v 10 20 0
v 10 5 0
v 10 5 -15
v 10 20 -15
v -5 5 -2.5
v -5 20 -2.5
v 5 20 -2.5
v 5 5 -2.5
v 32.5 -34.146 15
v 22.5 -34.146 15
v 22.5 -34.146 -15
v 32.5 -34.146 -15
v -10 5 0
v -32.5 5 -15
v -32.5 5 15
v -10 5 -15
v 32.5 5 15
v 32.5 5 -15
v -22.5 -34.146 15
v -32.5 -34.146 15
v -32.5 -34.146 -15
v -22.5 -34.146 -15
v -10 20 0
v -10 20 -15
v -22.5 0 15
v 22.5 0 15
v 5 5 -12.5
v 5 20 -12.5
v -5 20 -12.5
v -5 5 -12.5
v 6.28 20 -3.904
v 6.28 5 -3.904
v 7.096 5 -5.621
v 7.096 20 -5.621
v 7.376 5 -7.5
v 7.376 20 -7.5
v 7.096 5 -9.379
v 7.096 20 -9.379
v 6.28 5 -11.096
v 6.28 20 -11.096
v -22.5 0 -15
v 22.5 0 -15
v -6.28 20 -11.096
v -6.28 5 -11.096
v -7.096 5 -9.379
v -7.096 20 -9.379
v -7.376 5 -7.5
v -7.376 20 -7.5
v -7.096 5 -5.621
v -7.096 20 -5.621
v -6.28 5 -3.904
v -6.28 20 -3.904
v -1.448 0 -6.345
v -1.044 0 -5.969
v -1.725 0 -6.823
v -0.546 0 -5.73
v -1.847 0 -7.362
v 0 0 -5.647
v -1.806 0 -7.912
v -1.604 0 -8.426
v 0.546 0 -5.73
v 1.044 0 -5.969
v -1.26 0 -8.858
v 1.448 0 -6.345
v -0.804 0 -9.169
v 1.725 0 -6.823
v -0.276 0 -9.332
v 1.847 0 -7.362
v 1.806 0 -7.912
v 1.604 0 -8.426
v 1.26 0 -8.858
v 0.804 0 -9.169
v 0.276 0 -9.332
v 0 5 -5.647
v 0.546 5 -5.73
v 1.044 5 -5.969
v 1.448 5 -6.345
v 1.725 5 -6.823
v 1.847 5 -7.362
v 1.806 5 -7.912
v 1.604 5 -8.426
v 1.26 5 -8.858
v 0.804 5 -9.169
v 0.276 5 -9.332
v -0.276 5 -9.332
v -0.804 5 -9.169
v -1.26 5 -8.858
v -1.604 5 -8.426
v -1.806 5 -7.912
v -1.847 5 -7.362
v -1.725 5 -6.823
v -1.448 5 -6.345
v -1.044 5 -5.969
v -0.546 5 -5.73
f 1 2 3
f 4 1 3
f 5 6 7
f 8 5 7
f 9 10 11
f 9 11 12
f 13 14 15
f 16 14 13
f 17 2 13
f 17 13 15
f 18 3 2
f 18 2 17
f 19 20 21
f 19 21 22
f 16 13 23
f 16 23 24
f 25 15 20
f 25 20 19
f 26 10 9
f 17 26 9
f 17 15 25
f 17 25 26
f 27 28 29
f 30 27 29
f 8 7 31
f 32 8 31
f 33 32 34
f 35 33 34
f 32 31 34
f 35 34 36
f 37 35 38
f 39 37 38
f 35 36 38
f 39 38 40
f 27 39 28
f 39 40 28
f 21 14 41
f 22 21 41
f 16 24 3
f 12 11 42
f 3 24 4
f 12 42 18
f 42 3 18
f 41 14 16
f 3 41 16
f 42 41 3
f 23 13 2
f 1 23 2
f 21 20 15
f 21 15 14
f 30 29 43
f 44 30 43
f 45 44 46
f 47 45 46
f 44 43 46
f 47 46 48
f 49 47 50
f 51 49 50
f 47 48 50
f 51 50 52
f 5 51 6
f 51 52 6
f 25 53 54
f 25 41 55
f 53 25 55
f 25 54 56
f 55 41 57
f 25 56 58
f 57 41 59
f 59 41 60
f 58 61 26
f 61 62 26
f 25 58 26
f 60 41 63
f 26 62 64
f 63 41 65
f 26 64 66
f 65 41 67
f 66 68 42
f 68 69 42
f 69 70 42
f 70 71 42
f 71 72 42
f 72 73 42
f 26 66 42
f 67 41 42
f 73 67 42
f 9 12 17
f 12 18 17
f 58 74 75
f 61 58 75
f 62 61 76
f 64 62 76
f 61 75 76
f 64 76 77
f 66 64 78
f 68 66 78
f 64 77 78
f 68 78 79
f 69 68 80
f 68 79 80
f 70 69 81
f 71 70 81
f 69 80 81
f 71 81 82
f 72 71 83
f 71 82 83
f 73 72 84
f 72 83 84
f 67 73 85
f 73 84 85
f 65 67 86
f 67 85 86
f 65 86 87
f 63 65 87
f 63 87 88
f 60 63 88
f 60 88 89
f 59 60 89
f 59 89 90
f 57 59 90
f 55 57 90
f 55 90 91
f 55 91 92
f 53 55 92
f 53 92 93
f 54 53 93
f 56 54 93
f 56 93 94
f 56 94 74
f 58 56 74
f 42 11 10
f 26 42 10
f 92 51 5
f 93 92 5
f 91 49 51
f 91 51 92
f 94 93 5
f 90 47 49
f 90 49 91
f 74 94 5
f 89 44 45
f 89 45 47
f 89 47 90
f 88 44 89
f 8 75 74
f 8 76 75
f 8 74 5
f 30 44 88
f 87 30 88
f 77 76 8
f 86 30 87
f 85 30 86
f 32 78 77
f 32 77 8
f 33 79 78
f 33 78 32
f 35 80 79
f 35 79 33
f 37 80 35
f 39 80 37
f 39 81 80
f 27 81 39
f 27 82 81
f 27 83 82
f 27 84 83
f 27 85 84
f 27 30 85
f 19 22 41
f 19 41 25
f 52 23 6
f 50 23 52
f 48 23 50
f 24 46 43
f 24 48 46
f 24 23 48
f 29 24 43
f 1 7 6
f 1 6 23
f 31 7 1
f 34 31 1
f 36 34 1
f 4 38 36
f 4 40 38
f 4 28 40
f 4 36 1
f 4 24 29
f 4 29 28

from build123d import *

# Parameters (mm, degrees)
SKETCH1_W           = 65
SKETCH1_H           = 30
BOSS_EXTRUDE1_DEPTH = 5
SKETCH2_W           = 20
SKETCH2_H           = 15
BOSS_EXTRUDE2_DEPTH = 15
CUT_EXTRUDE1_DEPTH  = 15
SKETCH4_R           = 1.852641707
CUT_EXTRUDE2_DEPTH  = 39.810436741
SKETCH5_W           = 10
SKETCH5_H           = 30
BOSS_EXTRUDE3_DEPTH = 34.146213


with BuildPart() as part:
    # Sketch1 → Boss-Extrude1 (new body)
    with BuildSketch(Plane(origin=(0, 0, 0), x_dir=(1, 0, 0), z_dir=(0, 1, 0))):
        Rectangle(SKETCH1_W, SKETCH1_H)
    extrude(amount=BOSS_EXTRUDE1_DEPTH)

    # Sketch2 → Boss-Extrude2 (add)
    with BuildSketch(Plane(origin=(0, 5, 0), x_dir=(1, 0, 0), z_dir=(0, 1, 0))):
        with Locations((0, 7.5)):
            Rectangle(SKETCH2_W, SKETCH2_H)
    extrude(amount=BOSS_EXTRUDE2_DEPTH)

    # Sketch3 → Cut-Extrude1 (cut)
    with BuildSketch(Plane(origin=(0, 20, 0), x_dir=(1, 0, 0), z_dir=(0, 1, 0))):
        with BuildLine():
            Line((-5, 2.5), (5, 2.5))
            ThreePointArc((5, 2.5), (7.375699039, 7.5), (5, 12.5))
            Line((5, 12.5), (-5, 12.5))
            ThreePointArc((-5, 12.5), (-7.375699039, 7.5), (-5, 2.5))
        make_face()
    extrude(amount=-CUT_EXTRUDE1_DEPTH, mode=Mode.SUBTRACT)

    # Sketch4 → Cut-Extrude2 (cut, through all)
    with BuildSketch(Plane(origin=(0, 5, 0), x_dir=(1, 0, 0), z_dir=(0, 1, 0))):
        with Locations(Location((0, 7.5, 0), (0, 0, 270))):
            Circle(SKETCH4_R)
    extrude(amount=-CUT_EXTRUDE2_DEPTH, mode=Mode.SUBTRACT)

    # Sketch5 → Boss-Extrude3 (add)
    with BuildSketch(Plane.XZ):
        with Locations((27.5, 0)):
            Rectangle(SKETCH5_W, SKETCH5_H)
        with Locations((-27.5, 0)):
            Rectangle(SKETCH5_W, SKETCH5_H)
    extrude(amount=BOSS_EXTRUDE3_DEPTH)


solid = part.part
